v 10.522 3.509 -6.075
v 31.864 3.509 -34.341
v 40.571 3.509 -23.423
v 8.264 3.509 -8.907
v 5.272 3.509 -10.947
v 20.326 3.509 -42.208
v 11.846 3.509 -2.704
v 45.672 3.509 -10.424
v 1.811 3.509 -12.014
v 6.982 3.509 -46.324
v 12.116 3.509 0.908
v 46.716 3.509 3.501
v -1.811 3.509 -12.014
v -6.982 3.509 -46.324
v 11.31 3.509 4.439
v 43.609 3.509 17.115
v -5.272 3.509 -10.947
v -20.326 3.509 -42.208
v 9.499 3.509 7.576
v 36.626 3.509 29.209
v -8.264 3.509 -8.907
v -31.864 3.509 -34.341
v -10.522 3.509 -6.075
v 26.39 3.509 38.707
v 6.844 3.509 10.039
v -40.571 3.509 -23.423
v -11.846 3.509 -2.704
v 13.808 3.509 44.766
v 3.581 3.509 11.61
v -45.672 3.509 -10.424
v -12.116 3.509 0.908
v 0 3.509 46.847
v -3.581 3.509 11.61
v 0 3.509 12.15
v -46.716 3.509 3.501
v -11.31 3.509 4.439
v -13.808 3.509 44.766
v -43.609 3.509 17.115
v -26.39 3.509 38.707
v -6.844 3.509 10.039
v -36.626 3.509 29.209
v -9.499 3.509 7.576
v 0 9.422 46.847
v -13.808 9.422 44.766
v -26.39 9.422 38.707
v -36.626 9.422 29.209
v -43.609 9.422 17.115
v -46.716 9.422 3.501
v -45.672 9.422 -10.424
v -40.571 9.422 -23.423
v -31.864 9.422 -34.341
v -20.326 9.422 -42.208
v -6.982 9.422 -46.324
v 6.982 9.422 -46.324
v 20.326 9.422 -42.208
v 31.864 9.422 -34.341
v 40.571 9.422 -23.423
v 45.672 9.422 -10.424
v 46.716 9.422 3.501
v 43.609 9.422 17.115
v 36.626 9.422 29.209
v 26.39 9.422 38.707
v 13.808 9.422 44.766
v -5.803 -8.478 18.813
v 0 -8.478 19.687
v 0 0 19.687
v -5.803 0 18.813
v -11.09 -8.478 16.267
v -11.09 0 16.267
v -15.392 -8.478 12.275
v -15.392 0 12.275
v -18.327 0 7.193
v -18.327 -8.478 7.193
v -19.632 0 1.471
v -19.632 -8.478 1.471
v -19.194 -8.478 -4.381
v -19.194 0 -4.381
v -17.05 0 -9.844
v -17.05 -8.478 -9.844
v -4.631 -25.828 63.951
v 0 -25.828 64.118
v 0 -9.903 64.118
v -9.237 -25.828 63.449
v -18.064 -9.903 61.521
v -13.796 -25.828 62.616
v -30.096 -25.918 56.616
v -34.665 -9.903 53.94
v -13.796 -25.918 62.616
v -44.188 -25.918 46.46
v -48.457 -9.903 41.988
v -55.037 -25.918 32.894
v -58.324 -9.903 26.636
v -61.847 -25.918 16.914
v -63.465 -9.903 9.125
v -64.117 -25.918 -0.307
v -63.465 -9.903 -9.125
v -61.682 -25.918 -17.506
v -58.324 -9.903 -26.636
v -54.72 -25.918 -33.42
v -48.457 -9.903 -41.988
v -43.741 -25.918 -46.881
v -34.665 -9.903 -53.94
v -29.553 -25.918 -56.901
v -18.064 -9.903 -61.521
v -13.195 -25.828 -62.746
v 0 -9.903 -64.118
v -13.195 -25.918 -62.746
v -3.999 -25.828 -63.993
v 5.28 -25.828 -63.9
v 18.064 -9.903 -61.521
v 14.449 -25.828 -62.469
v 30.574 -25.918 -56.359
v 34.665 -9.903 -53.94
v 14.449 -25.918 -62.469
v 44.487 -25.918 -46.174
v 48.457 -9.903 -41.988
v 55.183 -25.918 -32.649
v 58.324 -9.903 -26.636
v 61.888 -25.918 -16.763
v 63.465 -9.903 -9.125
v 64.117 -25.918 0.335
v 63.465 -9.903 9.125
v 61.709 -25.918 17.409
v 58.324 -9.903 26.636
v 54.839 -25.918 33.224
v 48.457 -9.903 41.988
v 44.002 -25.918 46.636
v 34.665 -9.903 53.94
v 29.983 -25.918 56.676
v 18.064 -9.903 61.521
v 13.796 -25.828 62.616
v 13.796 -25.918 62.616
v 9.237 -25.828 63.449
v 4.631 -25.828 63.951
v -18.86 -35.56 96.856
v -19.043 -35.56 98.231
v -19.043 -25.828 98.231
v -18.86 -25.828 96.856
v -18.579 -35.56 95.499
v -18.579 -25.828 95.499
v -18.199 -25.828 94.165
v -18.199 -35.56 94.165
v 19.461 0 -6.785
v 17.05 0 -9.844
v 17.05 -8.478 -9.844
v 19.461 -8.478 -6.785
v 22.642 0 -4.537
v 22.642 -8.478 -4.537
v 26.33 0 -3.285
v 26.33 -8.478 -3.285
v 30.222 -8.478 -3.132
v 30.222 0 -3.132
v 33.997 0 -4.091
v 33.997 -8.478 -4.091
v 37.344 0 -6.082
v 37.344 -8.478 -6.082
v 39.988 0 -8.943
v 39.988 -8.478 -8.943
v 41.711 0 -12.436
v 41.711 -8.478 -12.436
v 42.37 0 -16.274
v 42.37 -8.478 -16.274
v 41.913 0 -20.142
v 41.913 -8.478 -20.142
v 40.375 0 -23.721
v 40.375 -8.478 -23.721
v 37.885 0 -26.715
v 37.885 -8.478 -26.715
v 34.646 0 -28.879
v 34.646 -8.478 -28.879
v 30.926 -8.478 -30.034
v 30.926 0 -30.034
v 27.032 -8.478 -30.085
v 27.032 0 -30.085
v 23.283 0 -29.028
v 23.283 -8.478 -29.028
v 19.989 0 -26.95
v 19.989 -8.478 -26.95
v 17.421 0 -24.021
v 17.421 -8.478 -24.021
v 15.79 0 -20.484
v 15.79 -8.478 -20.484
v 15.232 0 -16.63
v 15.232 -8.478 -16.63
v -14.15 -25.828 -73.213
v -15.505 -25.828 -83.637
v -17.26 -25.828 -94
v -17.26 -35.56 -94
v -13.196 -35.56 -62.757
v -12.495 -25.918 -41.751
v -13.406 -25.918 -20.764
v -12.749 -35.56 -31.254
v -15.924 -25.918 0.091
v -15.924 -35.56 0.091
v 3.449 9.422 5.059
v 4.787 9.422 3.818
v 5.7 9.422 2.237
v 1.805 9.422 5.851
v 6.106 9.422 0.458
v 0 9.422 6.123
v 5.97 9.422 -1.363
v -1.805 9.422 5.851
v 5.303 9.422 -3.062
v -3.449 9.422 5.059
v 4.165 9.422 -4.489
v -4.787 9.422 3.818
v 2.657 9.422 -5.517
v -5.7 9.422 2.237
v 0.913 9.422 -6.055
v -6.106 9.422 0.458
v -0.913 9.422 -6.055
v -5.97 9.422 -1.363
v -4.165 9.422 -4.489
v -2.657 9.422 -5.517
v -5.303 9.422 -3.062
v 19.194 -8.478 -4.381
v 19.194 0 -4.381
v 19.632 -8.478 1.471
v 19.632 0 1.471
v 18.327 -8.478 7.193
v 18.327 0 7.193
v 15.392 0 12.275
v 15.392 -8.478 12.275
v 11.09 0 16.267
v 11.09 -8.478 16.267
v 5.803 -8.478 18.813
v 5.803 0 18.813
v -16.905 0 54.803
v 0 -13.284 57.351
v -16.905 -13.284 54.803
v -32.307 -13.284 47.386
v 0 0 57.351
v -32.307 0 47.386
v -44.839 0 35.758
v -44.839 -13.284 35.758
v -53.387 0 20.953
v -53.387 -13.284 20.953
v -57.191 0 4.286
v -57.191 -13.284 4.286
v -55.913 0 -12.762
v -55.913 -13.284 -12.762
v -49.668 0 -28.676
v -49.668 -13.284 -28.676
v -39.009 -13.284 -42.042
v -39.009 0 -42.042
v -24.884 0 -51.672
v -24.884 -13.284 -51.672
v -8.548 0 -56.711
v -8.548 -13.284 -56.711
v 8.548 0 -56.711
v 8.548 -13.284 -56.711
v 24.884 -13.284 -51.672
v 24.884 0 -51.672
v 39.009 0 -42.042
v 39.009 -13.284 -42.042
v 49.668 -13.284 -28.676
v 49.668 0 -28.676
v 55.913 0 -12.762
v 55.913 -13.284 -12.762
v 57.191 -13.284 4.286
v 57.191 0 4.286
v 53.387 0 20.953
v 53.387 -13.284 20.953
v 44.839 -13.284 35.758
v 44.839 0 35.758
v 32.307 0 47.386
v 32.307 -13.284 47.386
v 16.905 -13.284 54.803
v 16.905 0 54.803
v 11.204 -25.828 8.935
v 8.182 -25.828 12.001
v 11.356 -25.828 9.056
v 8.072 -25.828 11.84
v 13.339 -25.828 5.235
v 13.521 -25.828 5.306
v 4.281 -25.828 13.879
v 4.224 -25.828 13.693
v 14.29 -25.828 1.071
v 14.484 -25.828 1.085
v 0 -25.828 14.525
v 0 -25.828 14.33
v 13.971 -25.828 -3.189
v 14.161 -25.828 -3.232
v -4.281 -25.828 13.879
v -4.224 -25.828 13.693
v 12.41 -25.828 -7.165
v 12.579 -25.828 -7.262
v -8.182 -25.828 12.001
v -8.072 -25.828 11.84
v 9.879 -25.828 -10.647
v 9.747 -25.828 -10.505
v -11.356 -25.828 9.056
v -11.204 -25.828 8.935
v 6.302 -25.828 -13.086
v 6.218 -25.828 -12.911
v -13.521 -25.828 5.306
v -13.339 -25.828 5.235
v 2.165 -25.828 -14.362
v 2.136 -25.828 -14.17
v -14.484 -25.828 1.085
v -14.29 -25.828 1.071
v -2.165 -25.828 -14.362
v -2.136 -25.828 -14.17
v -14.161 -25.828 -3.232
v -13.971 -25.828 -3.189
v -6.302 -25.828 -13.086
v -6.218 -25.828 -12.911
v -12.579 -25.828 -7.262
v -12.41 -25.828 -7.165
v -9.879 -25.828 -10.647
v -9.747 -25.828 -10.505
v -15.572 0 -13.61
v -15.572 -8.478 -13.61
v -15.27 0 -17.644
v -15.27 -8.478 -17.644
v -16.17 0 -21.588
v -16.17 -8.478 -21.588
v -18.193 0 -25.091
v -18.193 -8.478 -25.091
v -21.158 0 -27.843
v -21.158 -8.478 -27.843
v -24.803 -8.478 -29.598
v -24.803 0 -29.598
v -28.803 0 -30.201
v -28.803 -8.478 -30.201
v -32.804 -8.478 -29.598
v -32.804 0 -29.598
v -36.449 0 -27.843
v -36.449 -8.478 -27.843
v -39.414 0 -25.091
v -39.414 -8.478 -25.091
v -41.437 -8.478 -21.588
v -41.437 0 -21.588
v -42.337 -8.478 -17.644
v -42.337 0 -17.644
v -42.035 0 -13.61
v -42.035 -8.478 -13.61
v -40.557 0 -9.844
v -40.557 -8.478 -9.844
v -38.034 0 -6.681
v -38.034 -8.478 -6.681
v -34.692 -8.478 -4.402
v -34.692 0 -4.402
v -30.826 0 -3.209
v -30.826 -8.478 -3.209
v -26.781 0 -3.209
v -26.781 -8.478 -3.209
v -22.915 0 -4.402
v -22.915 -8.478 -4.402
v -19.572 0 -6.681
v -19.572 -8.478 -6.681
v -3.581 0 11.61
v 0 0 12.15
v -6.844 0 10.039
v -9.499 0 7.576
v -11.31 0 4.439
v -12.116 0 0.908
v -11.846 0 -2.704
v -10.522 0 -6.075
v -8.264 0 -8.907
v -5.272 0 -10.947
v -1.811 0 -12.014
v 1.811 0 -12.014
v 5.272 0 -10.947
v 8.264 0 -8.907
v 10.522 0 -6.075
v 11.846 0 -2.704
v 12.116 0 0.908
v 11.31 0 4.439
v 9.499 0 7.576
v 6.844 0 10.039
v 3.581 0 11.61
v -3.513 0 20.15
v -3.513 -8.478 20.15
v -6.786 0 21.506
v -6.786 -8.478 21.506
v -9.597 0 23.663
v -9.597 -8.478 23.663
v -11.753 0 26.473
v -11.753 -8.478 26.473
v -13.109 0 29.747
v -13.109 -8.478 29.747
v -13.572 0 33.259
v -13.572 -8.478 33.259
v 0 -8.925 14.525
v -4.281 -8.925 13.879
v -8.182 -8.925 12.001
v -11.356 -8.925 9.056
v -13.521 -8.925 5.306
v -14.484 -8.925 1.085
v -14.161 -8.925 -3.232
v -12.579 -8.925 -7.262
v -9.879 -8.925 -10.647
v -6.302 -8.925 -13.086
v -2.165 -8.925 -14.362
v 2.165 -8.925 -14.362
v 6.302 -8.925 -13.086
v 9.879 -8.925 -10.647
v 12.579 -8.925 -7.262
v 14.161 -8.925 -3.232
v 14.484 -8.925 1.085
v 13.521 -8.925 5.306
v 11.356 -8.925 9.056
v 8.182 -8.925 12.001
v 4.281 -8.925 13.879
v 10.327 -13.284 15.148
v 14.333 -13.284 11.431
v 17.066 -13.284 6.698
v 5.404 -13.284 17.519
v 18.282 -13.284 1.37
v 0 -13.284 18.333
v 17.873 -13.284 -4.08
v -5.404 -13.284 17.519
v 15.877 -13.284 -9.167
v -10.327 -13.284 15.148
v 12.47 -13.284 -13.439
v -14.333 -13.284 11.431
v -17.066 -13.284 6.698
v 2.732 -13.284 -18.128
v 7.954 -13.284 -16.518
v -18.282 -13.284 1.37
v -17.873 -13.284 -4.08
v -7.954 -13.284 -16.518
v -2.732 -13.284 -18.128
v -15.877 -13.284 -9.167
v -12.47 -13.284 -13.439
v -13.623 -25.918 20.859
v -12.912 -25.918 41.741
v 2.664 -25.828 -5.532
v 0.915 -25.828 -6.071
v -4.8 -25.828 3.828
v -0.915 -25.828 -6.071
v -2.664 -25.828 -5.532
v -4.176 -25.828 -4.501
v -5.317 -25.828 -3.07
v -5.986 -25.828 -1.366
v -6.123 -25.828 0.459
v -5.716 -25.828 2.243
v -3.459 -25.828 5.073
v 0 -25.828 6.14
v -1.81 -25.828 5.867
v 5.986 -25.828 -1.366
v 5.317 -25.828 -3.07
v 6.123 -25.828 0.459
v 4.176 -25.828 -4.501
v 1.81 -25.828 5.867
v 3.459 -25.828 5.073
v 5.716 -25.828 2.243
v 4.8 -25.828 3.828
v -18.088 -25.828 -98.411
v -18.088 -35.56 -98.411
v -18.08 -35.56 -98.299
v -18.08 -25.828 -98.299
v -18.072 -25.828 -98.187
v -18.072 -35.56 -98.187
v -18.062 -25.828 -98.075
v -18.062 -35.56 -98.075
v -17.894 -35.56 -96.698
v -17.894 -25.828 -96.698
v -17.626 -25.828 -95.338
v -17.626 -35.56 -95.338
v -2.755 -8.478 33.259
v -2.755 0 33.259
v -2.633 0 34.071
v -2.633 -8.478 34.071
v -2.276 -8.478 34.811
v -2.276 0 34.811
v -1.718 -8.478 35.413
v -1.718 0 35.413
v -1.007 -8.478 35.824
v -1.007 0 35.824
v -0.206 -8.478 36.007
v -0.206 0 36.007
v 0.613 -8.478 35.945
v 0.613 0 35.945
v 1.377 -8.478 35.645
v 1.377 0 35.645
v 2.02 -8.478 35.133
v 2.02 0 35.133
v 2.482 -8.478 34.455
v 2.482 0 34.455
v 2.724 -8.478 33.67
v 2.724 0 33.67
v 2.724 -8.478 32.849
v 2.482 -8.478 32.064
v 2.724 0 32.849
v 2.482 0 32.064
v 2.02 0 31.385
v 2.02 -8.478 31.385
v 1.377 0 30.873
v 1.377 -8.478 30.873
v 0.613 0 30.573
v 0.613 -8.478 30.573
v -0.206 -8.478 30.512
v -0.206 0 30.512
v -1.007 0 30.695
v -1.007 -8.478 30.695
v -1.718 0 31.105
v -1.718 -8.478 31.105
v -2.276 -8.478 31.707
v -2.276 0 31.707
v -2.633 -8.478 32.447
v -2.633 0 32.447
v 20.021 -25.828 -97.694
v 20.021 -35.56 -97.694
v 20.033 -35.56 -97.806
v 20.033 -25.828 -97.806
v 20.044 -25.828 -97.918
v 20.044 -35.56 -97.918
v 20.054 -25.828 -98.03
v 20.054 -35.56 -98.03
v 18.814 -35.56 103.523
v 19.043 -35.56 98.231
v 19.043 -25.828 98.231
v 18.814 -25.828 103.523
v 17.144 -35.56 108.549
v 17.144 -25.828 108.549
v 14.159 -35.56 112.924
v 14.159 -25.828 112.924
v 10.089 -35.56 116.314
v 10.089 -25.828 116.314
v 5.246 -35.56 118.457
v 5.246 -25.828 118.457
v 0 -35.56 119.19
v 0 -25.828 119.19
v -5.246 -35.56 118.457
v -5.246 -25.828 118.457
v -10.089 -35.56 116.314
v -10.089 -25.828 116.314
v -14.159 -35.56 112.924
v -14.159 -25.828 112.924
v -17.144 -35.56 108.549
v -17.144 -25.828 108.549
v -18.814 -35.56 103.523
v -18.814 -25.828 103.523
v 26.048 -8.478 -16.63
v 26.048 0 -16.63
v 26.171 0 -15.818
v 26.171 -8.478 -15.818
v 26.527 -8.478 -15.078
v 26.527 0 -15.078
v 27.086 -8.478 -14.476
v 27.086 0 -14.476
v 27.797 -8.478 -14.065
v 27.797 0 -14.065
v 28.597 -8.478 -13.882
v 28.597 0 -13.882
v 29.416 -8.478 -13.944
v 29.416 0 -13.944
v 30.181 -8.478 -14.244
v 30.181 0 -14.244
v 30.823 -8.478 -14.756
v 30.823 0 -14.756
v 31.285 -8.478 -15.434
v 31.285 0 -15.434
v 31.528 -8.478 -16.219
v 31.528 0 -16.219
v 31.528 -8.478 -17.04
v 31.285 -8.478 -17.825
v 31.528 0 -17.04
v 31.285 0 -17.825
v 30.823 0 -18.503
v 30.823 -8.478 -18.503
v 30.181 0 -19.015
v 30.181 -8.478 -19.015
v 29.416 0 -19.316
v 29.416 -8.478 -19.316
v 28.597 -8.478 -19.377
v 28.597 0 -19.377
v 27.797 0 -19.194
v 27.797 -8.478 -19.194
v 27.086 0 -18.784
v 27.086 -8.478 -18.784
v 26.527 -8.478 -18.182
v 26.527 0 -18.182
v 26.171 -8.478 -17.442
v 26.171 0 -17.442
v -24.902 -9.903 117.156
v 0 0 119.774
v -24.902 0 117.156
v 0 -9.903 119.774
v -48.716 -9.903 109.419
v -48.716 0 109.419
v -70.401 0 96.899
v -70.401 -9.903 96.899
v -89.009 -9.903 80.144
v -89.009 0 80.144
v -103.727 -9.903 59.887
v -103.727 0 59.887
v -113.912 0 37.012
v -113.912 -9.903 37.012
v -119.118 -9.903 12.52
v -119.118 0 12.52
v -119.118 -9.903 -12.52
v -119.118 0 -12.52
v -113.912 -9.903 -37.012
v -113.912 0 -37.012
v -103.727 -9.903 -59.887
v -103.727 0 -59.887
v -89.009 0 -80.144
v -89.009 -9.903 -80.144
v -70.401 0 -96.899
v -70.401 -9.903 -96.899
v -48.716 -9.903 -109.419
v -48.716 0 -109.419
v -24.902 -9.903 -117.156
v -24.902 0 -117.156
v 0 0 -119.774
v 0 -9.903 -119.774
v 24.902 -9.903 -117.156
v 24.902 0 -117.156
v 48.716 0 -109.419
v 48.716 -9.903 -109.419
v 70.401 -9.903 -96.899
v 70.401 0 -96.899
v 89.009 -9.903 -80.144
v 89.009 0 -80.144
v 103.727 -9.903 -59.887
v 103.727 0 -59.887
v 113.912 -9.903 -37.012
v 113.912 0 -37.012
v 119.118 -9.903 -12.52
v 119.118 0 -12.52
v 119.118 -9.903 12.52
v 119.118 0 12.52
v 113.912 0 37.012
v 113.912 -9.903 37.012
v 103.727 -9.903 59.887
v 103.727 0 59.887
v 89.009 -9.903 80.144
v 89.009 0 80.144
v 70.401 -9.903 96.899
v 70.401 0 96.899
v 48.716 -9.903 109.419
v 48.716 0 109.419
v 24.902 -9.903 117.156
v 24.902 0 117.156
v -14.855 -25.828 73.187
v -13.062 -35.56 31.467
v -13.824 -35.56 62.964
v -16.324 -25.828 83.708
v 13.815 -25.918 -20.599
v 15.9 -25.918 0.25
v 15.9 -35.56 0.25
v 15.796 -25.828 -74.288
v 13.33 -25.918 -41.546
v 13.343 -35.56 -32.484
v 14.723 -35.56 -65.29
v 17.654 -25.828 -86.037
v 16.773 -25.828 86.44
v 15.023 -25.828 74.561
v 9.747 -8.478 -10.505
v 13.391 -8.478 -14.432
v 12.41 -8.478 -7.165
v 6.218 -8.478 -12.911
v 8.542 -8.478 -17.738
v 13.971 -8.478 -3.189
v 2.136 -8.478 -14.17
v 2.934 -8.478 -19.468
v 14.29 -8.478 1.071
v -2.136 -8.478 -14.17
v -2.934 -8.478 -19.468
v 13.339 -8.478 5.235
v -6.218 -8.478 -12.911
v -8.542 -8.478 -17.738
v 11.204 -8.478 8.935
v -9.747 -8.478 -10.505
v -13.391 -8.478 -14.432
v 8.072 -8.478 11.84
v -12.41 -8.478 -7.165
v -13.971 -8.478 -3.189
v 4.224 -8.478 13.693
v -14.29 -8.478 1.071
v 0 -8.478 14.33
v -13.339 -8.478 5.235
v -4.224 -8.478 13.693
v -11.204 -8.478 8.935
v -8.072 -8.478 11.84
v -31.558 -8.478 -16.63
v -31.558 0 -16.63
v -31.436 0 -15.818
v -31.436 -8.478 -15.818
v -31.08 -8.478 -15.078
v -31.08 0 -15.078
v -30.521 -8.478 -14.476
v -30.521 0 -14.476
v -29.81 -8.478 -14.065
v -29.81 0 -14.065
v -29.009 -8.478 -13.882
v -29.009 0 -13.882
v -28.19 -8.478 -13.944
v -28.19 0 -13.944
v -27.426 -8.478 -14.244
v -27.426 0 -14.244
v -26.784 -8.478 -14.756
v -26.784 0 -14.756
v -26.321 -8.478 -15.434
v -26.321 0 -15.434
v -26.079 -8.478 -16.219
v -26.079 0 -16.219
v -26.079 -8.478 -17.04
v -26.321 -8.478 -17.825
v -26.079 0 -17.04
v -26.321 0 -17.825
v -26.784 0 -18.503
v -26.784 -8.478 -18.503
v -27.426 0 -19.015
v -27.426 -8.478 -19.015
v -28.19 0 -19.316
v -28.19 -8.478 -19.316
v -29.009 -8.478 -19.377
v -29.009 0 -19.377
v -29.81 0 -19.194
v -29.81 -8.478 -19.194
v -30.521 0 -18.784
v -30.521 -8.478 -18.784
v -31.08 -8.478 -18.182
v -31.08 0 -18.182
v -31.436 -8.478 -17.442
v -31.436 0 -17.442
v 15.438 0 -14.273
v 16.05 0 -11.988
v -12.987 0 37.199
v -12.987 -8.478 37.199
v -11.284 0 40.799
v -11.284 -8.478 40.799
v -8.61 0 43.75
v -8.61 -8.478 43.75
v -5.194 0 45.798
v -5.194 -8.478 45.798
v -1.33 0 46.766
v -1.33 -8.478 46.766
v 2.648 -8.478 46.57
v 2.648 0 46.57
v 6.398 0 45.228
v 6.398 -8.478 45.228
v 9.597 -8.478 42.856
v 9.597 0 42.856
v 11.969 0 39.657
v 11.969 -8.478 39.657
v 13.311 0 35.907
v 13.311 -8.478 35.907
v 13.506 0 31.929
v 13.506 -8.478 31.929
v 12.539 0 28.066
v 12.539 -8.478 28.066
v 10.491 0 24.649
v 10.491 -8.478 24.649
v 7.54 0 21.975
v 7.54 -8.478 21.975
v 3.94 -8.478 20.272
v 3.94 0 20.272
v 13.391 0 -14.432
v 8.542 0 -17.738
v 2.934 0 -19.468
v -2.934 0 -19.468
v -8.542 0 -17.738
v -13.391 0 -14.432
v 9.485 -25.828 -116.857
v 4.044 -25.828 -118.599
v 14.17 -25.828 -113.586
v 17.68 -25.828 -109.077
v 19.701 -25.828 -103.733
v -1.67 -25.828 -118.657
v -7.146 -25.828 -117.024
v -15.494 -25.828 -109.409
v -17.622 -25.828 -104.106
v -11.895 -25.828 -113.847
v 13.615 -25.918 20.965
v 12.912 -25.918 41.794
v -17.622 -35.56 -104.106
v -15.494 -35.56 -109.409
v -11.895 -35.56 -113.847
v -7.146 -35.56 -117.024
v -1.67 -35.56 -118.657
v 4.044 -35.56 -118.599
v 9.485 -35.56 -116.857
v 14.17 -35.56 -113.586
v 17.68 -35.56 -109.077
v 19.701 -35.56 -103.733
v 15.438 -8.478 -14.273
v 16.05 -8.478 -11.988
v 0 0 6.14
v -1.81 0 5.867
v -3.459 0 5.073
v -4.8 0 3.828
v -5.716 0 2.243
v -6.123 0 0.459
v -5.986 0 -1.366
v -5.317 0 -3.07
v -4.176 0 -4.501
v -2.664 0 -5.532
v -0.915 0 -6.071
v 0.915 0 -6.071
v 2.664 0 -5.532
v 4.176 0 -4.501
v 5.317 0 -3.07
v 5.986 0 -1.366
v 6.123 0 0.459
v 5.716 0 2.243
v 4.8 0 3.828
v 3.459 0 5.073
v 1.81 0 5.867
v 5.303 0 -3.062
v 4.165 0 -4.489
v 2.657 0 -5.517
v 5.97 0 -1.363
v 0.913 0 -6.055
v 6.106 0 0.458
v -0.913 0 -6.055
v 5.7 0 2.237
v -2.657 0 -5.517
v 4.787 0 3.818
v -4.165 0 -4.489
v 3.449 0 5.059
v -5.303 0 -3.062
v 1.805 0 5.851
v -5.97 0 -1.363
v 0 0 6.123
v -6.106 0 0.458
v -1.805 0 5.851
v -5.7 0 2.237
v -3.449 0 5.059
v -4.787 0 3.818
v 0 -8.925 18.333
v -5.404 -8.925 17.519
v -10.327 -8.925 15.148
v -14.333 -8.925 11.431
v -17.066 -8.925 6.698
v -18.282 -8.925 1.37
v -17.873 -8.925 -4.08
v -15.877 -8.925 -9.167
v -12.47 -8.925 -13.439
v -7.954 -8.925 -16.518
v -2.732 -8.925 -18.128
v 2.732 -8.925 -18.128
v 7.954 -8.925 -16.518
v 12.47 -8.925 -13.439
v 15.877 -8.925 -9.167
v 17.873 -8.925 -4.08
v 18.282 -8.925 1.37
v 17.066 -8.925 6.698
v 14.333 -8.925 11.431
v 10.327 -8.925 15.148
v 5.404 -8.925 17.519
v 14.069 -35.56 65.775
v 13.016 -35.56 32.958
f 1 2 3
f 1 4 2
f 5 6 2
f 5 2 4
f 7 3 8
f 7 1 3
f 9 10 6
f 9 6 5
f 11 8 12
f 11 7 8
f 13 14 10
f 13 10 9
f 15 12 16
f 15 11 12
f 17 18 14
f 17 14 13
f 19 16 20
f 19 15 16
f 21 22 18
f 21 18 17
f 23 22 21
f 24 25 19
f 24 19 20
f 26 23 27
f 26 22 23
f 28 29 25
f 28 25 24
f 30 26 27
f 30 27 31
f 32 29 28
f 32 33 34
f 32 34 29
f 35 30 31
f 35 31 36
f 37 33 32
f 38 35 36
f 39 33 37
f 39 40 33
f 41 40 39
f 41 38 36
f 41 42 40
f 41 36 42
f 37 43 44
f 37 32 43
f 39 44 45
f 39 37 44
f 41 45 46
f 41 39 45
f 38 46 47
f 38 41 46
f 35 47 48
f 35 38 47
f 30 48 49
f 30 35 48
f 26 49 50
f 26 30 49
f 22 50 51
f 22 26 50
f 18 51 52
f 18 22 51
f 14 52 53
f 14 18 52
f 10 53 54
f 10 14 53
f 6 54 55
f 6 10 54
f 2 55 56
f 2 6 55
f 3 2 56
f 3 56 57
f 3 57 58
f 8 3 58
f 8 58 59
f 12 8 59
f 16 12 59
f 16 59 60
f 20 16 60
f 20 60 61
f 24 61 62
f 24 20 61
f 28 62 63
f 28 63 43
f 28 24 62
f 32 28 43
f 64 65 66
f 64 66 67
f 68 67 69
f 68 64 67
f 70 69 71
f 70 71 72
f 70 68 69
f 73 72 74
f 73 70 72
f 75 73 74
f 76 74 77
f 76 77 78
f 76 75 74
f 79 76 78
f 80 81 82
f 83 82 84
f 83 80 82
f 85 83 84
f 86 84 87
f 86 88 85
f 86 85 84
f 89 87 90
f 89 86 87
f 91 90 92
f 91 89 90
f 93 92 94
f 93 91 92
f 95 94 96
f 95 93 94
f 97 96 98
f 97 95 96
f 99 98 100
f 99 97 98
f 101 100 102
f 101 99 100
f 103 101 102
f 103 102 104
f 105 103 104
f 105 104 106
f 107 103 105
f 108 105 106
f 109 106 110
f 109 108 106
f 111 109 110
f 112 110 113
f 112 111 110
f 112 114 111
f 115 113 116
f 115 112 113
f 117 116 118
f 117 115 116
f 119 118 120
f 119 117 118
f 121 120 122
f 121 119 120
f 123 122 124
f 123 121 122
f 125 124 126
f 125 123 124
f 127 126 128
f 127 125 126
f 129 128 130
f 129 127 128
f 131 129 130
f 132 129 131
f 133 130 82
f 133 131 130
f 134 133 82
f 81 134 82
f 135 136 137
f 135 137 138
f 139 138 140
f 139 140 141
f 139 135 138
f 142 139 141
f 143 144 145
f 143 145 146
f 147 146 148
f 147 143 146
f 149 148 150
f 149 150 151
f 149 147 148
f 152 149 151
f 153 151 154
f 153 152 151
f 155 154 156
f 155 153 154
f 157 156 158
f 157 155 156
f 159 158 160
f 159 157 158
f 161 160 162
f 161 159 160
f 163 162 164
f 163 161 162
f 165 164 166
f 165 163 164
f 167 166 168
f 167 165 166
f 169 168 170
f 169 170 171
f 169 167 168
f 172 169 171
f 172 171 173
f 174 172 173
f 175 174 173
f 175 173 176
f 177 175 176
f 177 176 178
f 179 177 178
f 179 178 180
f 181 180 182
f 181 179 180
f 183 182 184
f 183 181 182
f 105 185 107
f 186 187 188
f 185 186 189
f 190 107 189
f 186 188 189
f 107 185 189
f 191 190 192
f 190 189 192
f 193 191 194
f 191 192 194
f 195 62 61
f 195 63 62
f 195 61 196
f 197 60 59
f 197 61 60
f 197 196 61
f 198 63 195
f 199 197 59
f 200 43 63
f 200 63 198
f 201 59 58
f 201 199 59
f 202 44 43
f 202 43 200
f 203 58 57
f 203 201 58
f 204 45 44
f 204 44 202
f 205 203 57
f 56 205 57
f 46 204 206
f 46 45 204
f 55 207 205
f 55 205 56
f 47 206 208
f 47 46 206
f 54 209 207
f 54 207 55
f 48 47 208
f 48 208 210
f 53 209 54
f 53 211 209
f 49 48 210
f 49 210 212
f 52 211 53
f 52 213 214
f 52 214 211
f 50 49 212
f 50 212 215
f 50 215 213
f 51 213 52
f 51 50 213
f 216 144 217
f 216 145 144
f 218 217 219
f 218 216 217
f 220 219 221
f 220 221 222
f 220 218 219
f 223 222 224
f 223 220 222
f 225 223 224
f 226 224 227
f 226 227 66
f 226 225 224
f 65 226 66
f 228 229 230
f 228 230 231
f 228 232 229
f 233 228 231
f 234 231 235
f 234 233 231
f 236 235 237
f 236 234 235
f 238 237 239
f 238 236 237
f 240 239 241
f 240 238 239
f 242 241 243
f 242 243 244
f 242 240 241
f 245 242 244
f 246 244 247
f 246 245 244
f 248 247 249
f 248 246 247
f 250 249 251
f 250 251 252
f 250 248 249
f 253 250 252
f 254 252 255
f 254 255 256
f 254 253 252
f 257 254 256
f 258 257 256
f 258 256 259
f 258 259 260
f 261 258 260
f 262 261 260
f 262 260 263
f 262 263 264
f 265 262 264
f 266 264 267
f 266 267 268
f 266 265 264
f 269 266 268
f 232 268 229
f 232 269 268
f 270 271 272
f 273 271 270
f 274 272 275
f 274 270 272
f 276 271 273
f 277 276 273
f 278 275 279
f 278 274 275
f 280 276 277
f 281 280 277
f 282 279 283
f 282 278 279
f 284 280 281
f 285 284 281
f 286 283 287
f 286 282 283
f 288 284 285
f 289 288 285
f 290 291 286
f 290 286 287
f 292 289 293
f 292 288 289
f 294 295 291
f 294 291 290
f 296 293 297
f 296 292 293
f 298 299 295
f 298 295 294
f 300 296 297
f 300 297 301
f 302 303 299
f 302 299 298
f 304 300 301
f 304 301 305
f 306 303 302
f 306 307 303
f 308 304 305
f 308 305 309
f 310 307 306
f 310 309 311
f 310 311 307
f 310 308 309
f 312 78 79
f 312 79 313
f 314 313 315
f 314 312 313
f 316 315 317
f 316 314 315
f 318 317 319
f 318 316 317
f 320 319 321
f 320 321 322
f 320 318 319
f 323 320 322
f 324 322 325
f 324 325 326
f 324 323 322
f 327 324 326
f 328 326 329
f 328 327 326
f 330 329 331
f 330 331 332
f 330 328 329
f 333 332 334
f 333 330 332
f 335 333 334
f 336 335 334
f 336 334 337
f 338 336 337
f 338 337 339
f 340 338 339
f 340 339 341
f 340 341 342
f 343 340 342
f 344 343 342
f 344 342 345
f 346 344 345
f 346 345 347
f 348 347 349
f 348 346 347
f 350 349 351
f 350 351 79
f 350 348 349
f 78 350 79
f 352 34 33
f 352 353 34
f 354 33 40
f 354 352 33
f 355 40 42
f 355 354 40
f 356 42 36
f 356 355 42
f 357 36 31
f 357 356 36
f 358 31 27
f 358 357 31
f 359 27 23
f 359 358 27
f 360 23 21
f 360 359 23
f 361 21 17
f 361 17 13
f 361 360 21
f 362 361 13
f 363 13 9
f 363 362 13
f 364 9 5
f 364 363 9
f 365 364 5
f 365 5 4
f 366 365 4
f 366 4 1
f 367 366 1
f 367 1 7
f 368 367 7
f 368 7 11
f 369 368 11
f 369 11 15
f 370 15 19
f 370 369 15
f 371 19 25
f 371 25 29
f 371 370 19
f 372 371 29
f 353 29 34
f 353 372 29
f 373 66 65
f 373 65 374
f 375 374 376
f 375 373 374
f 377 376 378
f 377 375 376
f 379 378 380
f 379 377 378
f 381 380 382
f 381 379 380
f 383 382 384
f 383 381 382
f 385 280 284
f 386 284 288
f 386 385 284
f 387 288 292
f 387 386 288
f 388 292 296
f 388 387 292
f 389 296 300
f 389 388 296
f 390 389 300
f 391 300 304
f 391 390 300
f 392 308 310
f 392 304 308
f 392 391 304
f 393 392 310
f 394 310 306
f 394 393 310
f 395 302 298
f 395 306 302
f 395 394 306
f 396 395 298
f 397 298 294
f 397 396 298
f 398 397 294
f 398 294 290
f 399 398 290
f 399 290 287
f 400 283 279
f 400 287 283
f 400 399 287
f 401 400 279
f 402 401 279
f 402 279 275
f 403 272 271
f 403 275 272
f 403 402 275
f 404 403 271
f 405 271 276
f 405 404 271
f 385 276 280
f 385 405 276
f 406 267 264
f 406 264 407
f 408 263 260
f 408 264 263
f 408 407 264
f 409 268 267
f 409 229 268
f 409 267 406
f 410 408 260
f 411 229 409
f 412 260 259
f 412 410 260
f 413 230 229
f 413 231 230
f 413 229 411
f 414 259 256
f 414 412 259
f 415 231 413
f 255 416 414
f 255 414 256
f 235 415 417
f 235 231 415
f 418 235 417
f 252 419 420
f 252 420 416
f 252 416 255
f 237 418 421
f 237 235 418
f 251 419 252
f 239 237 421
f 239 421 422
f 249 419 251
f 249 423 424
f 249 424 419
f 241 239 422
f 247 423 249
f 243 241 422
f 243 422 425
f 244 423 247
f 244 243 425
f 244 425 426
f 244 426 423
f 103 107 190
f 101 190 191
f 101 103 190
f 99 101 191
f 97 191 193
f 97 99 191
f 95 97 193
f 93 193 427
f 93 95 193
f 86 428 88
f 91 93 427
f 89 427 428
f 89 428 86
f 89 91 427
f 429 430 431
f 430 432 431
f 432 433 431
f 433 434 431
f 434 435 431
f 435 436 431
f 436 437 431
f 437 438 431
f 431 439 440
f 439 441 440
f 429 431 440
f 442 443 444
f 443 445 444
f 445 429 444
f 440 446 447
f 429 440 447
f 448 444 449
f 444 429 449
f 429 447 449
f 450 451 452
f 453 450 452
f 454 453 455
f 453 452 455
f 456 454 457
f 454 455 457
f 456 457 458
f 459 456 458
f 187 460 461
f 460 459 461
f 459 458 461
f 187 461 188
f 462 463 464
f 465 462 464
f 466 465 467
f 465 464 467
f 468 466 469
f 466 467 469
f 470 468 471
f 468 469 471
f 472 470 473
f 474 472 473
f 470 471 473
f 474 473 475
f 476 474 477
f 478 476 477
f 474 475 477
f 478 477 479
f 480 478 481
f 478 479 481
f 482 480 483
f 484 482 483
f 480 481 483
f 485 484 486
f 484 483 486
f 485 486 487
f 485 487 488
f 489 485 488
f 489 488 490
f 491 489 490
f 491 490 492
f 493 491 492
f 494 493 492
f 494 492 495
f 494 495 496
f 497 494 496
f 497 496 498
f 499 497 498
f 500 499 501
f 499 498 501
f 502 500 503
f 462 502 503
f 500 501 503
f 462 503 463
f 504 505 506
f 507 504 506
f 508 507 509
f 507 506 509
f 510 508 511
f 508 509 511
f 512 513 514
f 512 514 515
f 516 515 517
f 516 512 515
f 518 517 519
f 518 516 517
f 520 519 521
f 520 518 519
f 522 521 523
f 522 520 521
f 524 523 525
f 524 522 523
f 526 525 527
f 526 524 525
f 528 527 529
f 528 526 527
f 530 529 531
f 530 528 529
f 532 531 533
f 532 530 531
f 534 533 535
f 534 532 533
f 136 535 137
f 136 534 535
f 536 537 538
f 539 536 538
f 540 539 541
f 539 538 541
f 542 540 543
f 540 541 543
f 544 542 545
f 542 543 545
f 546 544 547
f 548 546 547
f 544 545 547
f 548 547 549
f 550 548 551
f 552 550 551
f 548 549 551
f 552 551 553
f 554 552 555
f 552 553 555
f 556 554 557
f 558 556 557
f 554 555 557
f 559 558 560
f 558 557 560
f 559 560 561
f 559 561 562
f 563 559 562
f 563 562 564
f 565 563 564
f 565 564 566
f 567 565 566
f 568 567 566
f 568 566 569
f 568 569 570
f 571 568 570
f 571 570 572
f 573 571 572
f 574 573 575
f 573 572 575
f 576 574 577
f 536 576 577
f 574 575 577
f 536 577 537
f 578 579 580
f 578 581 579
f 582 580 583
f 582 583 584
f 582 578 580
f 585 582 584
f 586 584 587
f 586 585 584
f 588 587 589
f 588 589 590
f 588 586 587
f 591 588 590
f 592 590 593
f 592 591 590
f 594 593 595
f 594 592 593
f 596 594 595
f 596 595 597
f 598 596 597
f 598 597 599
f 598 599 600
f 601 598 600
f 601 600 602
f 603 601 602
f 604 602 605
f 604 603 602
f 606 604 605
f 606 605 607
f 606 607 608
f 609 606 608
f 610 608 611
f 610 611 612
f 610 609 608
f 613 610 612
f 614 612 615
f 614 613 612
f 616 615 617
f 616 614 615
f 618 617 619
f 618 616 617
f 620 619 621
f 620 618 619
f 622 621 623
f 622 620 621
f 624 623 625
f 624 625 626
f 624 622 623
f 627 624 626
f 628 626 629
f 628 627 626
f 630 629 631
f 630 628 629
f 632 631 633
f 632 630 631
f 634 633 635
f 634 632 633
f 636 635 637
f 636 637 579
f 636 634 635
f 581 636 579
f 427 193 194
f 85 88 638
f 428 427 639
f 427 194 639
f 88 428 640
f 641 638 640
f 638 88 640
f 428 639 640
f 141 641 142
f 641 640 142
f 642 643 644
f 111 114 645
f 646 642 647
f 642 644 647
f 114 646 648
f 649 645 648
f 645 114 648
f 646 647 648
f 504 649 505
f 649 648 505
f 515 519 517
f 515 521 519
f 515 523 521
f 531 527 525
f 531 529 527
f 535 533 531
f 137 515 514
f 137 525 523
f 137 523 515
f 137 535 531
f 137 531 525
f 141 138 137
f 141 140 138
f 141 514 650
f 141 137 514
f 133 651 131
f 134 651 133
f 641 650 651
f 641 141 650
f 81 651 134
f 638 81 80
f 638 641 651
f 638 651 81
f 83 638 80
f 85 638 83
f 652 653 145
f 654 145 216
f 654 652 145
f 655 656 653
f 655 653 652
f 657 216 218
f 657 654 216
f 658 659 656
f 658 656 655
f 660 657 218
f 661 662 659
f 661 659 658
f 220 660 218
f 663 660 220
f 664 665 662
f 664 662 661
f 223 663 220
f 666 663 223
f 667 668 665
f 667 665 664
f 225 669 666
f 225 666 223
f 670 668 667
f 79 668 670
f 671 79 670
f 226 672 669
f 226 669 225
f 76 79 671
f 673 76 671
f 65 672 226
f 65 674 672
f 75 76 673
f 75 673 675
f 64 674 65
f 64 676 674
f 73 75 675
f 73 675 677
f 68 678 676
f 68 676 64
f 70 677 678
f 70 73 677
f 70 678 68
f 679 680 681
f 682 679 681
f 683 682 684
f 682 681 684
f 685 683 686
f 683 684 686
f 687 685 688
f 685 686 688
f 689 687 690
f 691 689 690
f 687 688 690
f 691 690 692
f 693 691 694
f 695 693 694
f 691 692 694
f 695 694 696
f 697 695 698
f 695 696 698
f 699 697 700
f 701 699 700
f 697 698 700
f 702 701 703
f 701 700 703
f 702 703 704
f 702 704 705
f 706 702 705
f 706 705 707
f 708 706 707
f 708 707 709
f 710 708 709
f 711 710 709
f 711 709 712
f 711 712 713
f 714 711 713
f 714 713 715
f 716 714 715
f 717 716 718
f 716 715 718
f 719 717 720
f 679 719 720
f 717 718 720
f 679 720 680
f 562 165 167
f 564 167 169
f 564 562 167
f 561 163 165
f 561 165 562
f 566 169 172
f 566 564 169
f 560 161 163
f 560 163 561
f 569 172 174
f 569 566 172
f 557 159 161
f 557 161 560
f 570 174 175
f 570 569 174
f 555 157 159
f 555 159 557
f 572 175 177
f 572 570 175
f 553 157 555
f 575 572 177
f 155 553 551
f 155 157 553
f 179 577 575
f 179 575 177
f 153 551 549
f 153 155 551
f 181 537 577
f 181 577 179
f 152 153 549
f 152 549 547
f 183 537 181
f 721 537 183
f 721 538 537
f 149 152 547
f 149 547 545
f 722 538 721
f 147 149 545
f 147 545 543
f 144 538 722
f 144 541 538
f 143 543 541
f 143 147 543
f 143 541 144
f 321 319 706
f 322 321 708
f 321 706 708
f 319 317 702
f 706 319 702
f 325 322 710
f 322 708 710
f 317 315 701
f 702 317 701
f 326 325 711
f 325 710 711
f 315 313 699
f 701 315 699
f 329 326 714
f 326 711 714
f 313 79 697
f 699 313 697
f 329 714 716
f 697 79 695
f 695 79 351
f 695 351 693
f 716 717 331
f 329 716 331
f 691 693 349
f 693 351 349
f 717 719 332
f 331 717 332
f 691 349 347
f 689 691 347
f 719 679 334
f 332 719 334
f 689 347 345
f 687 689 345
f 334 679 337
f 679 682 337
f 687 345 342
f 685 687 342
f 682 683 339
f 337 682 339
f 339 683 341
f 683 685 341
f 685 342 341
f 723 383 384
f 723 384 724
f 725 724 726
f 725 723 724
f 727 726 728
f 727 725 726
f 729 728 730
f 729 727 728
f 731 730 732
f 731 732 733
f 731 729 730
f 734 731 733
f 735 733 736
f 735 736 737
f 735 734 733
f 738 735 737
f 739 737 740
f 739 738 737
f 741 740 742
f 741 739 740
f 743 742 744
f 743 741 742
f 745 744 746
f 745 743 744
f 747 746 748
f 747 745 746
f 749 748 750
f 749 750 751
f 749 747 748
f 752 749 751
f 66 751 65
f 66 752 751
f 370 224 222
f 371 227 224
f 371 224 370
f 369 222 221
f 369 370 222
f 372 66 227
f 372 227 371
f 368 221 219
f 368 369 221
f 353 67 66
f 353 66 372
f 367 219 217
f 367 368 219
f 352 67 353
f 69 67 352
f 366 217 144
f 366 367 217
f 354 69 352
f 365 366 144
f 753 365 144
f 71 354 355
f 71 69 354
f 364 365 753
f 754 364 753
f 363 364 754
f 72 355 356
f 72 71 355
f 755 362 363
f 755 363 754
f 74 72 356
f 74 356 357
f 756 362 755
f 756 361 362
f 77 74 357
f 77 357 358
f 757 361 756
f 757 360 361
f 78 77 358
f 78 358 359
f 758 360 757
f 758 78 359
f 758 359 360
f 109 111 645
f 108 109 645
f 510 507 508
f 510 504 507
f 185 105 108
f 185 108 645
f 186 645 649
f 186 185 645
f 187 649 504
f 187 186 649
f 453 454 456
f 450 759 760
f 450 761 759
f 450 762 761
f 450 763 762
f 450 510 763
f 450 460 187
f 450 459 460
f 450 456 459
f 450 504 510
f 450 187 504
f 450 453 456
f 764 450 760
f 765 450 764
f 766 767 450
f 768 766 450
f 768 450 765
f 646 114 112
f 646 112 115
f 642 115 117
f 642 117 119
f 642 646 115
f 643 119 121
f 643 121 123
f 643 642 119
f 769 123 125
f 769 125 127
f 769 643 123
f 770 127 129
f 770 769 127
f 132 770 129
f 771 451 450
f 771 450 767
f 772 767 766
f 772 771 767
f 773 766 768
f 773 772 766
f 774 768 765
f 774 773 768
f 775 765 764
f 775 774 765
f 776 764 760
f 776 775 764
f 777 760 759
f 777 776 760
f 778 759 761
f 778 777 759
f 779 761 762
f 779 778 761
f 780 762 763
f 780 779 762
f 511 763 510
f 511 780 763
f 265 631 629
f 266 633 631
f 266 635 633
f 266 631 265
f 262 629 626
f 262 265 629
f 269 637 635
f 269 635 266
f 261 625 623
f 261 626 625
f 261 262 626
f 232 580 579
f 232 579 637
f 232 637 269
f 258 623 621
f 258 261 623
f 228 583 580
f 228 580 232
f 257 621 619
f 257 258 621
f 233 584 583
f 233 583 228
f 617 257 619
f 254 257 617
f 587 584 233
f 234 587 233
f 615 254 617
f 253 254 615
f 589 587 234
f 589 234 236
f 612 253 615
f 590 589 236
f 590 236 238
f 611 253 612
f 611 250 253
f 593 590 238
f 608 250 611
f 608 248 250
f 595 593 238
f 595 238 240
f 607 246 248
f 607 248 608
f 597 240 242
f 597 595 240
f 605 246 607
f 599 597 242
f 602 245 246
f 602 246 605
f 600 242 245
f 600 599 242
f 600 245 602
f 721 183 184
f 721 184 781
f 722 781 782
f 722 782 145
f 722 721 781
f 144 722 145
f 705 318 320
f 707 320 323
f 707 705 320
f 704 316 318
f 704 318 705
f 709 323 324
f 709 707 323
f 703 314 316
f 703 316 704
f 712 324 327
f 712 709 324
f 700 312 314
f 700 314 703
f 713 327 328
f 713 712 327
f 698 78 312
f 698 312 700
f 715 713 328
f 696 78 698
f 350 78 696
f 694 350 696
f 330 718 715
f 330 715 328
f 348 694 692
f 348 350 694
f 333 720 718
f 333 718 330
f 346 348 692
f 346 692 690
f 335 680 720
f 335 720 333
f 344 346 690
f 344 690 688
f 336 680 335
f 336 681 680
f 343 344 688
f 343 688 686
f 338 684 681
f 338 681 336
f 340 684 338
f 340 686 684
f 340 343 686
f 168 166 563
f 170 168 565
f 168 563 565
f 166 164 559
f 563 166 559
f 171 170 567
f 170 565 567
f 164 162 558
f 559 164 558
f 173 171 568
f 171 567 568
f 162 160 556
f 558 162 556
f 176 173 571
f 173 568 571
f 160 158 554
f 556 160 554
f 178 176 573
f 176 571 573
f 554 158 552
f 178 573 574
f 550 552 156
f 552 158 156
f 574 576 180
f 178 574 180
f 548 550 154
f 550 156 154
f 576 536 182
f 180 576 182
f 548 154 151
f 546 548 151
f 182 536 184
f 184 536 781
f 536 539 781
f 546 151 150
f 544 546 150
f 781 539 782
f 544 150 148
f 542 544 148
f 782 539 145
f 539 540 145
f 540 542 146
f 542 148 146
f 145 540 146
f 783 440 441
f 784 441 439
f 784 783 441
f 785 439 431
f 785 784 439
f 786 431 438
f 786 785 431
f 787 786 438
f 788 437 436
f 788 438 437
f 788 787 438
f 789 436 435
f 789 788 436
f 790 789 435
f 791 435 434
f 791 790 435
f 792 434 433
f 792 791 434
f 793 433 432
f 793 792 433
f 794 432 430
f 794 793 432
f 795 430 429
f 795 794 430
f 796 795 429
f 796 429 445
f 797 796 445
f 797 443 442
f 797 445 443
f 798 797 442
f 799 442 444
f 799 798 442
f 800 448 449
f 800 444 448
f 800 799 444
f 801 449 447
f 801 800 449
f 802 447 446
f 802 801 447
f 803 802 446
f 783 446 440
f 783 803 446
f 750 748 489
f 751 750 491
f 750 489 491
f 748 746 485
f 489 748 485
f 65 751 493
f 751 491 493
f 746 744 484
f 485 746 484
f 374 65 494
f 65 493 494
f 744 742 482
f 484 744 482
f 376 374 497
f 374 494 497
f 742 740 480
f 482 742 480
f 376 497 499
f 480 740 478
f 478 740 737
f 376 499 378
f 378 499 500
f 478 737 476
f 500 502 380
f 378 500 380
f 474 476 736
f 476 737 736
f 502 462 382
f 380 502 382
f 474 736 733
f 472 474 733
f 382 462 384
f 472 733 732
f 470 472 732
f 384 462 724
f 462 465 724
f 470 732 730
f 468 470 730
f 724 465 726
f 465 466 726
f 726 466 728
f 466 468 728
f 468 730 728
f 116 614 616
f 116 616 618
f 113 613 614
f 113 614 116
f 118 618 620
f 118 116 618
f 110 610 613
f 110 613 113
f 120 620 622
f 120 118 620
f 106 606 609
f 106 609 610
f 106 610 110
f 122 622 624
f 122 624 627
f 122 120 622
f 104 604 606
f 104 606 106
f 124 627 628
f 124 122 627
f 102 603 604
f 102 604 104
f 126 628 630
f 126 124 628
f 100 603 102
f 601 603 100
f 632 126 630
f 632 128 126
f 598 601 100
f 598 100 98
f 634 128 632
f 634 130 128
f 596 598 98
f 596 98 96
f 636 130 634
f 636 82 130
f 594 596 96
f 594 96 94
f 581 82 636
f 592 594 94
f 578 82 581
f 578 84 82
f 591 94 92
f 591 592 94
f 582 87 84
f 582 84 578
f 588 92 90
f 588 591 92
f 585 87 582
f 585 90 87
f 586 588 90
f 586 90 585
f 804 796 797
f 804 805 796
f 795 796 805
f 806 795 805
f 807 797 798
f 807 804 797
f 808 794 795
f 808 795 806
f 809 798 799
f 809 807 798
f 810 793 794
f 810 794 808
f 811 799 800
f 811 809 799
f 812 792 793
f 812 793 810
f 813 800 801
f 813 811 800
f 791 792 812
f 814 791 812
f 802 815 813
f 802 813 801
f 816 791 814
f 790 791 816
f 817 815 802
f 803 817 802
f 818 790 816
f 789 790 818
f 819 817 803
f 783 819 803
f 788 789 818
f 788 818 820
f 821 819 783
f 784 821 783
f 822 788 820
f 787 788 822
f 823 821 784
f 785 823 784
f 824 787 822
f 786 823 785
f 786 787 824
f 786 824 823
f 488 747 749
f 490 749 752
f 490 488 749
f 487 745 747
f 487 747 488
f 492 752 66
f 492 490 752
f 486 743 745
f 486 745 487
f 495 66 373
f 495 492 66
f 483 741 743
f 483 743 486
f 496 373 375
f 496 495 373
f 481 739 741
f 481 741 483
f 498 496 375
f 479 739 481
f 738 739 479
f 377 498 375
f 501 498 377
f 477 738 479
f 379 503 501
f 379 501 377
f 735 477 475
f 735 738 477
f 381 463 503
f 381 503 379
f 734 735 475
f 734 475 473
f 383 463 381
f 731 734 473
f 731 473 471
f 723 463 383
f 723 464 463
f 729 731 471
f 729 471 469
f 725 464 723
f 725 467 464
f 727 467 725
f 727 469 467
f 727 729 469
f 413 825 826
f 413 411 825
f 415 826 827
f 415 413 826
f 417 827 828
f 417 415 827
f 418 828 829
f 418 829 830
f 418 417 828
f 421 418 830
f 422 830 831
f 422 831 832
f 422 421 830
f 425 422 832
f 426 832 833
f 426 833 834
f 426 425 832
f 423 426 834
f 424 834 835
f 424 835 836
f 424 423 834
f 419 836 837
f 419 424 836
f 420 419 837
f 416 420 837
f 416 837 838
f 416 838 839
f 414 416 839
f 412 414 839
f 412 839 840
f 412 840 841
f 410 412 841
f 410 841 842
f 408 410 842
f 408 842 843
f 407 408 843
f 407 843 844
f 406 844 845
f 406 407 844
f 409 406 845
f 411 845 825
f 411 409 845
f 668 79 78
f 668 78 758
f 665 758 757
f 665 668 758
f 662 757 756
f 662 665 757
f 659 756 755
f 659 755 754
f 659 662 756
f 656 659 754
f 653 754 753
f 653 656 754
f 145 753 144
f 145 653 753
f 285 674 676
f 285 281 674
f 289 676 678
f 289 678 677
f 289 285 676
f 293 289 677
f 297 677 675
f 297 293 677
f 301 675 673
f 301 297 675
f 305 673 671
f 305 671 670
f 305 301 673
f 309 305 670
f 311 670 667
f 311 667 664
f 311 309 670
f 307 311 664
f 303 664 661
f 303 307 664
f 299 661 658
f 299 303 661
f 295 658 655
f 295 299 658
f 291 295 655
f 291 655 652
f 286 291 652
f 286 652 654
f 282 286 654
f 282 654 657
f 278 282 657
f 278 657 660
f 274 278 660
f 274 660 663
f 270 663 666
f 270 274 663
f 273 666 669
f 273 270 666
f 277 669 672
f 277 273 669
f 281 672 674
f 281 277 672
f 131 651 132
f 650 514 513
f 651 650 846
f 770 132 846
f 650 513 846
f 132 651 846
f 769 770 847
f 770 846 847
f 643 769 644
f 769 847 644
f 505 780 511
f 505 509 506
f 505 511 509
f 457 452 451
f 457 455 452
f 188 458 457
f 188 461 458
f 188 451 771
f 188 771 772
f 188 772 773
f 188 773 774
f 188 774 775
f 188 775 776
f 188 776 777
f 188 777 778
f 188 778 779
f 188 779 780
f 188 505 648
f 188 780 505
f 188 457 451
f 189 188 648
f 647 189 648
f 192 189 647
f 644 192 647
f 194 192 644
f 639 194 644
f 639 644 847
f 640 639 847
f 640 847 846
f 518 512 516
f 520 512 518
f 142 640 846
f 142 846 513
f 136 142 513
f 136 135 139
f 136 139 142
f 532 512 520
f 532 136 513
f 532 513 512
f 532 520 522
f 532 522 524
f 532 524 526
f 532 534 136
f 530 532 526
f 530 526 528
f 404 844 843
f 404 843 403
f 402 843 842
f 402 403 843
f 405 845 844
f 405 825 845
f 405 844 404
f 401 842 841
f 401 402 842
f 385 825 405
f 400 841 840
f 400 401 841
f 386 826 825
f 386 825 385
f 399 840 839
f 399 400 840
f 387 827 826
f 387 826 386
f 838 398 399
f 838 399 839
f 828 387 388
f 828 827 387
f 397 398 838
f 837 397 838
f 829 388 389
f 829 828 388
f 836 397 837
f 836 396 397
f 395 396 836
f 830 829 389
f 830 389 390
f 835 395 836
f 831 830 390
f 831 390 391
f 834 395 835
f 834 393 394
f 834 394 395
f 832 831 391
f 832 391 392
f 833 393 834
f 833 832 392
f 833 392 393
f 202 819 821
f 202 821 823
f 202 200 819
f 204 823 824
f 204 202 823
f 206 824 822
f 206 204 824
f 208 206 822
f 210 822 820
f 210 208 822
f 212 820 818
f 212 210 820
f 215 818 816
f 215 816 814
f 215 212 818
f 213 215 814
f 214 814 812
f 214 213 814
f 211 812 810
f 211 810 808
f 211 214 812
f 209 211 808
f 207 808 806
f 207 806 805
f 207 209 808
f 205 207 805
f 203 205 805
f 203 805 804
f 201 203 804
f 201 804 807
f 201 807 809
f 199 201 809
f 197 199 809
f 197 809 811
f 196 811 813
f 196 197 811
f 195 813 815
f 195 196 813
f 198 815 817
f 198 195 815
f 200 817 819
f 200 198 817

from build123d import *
from build123d import SkipClean  # not in build123d's __all__

# Parameters (mm, degrees)
F3_DEPTH = 25
F4_DEPTH = 9.7316764295
F5_R     = 2.7549652458
F6_DEPTH = 8.4777977318


with BuildPart() as f1:
    # F0 (on Right) → F1 (revolve)
    with BuildSketch(Plane.YZ):
        Polygon((0, 6.1400169507), (0, 8.2560488954), (0, 19.687499851), (-8.4777977318, 19.687499851), (-8.4777977318, 14.3298944458), (-25.8282721043, 14.3298944458), (-25.8282721043, 100.0597700477), (-35.5599485338, 100.0597700477), (-35.5599485338, 6.1400169507), align=None)
    revolve(axis=Axis((0, -24.406015873, 0), (0, -1, 0)))

    # F2 (on face) → F3 (cut)
    with BuildSketch(Plane.XZ.offset(35.5599485338)):
        with BuildLine():
            ThreePointArc((100.0597700477, 0), (77.1925232945, 63.6653118222), (19.0427553675, 98.2310085971))
            ThreePointArc((19.0427553675, 98.2310085971), (13.0501122552, 49.3824410014), (15.9002061052, 0.2502591582))
            ThreePointArc((15.9002061052, 0.2502591582), (13.5409533991, -48.9079370484), (20.0211640805, -97.6942178777))
            ThreePointArc((20.0211640805, -97.6942178777), (20.0382067589, -97.8618404932), (20.0537724887, -98.0296067062))
            ThreePointArc((20.0537724887, -98.0296067062), (77.5194602851, -63.2668227359), (100.0597700477, 0))
        make_face()
        with BuildLine():
            ThreePointArc((-18.1994950958, 94.1649181676), (-18.6134156028, 96.1995622705), (-19.0427553675, 98.2310085971))
            ThreePointArc((-19.0427553675, 98.2310085971), (-18.7317798871, 96.1750148827), (-18.1994950958, 94.1649181676))
        make_face()
        with BuildLine():
            ThreePointArc((-18.1994950958, 94.1649181676), (-18.7317798871, 96.1750148827), (-19.0427553675, 98.2310085971))
            ThreePointArc((-19.0427553675, 98.2310085971), (-100.058591646, -0.4856128205), (-18.0883946868, -98.4112166353))
            ThreePointArc((-18.0883946868, -98.4112166353), (-18.0761635611, -98.2428461722), (-18.0624471565, -98.0745901959))
            ThreePointArc((-18.0624471565, -98.0745901959), (-17.7720210603, -96.0155932105), (-17.2598383027, -94.0002806477))
            ThreePointArc((-17.2598383027, -94.0002806477), (-12.518858774, -47.0123005144), (-15.9239394561, 0.0913361759))
            ThreePointArc((-15.9239394561, 0.0913361759), (-12.9894678609, 47.2266312356), (-18.1994950958, 94.1649181676))
        make_face()
    extrude(amount=-F3_DEPTH, mode=Mode.SUBTRACT)

    # F2 (on face) → F4 (join, through all)
    with BuildSketch(Plane.XZ.offset(35.5599485338)):
        with BuildLine():
            ThreePointArc((15.9002061052, 0.2502591582), (13.0501122552, 49.3824410014), (19.0427553675, 98.2310085971))
            ThreePointArc((19.0427553675, 98.2310085971), (0, 119.1901359728), (-19.0427553675, 98.2310085971))
            ThreePointArc((-19.0427553675, 98.2310085971), (-18.6134156028, 96.1995622705), (-18.1994950958, 94.1649181676))
            ThreePointArc((-18.1994950958, 94.1649181676), (-12.9894678609, 47.2266312356), (-15.9239394561, 0.0913361759))
            ThreePointArc((-15.9239394561, 0.0913361759), (-12.518858774, -47.0123005144), (-17.2598383027, -94.0002806477))
            ThreePointArc((-17.2598383027, -94.0002806477), (-17.6534175167, -96.0389572316), (-18.0624471565, -98.0745901959))
            ThreePointArc((-18.0624471565, -98.0745901959), (1.1886840484, -118.8424860853), (20.0211640805, -97.6942178777))
            ThreePointArc((20.0211640805, -97.6942178777), (13.5409533991, -48.9079370484), (15.9002061052, 0.2502591582))
        make_face()
        with BuildLine():
            ThreePointArc((-18.1994950958, 94.1649181676), (-18.6134156028, 96.1995622705), (-19.0427553675, 98.2310085971))
            ThreePointArc((-19.0427553675, 98.2310085971), (-18.7317798871, 96.1750148827), (-18.1994950958, 94.1649181676))
        make_face()
        with BuildLine():
            ThreePointArc((-17.2598383027, -94.0002806477), (-17.7720210603, -96.0155932105), (-18.0624471565, -98.0745901959))
            ThreePointArc((-18.0624471565, -98.0745901959), (-17.6534175167, -96.0389572316), (-17.2598383027, -94.0002806477))
        make_face()
    with SkipClean():  # cleaning this boolean's faces spoils the solid; the shape is the same uncleaned
        extrude(amount=-F4_DEPTH)

    # F5 (on face) → F6 (join, through all)
    with BuildSketch(Plane(origin=(0, 0, 0), x_dir=(-1, 0, 0), z_dir=(0, 1, 0))):
        with BuildLine():
            ThreePointArc((5.24e-08, 19.687499851), (9.5966715729, 23.662571381), (13.5717430658, 33.2592429167))
            ThreePointArc((13.5717430658, 33.2592429167), (-9.5966715729, 42.8559144525), (5.24e-08, 19.687499851))
        make_face()
        with Locations((0, 33.2592429167)):
            Circle(F5_R, mode=Mode.SUBTRACT)
        with BuildLine():
            ThreePointArc((-15.2316062108, -16.6296214584), (-15.6940521066, -13.1169960083), (-17.0498748728, -9.8437501596))
            ThreePointArc((-17.0498748728, -9.8437501596), (-41.9126464465, -20.1422469085), (-15.2316062108, -16.6296214584))
        make_face()
        with Locations((-28.8033492765, -16.6296214584)):
            Circle(F5_R, mode=Mode.SUBTRACT)
        with BuildLine():
            ThreePointArc((42.3750923423, -16.6296214584), (32.3159749035, -3.5203243358), (17.0498750559, -9.8437498425))
            ThreePointArc((17.0498750559, -9.8437498425), (25.2907236496, -29.7389185809), (42.3750923423, -16.6296214584))
        make_face()
        with Locations((28.8033492765, -16.6296214584)):
            Circle(F5_R, mode=Mode.SUBTRACT)
    extrude(amount=-F6_DEPTH)

    # F7 (on Right) → F8 (revolve)
    with BuildSketch(Plane.YZ):
        Polygon((0, 12.1502038091), (0, 6.1231274158), (9.4215124846, 6.1231274158), (9.4215124846, 46.8469522893), (3.5086337011, 46.8469522893), (3.5086337011, 12.1502038091), align=None)
        Polygon((-25.9181205183, 64.11806494), (-25.9181205183, 21.7532776296), (-25.9181205183, 14.5246991888), (-8.9246770367, 14.5246991888), (-8.9246770367, 18.3331295848), (-13.284237124, 18.3331295848), (-13.284237124, 57.3514103889), (0, 57.3514103889), (0, 119.7736561298), (-9.902862832, 119.7736561298), (-9.902862832, 64.11806494), align=None)
    revolve(axis=Axis((0, -24.5498530567, 0), (0, -1, 0)))


solid = f1.part
